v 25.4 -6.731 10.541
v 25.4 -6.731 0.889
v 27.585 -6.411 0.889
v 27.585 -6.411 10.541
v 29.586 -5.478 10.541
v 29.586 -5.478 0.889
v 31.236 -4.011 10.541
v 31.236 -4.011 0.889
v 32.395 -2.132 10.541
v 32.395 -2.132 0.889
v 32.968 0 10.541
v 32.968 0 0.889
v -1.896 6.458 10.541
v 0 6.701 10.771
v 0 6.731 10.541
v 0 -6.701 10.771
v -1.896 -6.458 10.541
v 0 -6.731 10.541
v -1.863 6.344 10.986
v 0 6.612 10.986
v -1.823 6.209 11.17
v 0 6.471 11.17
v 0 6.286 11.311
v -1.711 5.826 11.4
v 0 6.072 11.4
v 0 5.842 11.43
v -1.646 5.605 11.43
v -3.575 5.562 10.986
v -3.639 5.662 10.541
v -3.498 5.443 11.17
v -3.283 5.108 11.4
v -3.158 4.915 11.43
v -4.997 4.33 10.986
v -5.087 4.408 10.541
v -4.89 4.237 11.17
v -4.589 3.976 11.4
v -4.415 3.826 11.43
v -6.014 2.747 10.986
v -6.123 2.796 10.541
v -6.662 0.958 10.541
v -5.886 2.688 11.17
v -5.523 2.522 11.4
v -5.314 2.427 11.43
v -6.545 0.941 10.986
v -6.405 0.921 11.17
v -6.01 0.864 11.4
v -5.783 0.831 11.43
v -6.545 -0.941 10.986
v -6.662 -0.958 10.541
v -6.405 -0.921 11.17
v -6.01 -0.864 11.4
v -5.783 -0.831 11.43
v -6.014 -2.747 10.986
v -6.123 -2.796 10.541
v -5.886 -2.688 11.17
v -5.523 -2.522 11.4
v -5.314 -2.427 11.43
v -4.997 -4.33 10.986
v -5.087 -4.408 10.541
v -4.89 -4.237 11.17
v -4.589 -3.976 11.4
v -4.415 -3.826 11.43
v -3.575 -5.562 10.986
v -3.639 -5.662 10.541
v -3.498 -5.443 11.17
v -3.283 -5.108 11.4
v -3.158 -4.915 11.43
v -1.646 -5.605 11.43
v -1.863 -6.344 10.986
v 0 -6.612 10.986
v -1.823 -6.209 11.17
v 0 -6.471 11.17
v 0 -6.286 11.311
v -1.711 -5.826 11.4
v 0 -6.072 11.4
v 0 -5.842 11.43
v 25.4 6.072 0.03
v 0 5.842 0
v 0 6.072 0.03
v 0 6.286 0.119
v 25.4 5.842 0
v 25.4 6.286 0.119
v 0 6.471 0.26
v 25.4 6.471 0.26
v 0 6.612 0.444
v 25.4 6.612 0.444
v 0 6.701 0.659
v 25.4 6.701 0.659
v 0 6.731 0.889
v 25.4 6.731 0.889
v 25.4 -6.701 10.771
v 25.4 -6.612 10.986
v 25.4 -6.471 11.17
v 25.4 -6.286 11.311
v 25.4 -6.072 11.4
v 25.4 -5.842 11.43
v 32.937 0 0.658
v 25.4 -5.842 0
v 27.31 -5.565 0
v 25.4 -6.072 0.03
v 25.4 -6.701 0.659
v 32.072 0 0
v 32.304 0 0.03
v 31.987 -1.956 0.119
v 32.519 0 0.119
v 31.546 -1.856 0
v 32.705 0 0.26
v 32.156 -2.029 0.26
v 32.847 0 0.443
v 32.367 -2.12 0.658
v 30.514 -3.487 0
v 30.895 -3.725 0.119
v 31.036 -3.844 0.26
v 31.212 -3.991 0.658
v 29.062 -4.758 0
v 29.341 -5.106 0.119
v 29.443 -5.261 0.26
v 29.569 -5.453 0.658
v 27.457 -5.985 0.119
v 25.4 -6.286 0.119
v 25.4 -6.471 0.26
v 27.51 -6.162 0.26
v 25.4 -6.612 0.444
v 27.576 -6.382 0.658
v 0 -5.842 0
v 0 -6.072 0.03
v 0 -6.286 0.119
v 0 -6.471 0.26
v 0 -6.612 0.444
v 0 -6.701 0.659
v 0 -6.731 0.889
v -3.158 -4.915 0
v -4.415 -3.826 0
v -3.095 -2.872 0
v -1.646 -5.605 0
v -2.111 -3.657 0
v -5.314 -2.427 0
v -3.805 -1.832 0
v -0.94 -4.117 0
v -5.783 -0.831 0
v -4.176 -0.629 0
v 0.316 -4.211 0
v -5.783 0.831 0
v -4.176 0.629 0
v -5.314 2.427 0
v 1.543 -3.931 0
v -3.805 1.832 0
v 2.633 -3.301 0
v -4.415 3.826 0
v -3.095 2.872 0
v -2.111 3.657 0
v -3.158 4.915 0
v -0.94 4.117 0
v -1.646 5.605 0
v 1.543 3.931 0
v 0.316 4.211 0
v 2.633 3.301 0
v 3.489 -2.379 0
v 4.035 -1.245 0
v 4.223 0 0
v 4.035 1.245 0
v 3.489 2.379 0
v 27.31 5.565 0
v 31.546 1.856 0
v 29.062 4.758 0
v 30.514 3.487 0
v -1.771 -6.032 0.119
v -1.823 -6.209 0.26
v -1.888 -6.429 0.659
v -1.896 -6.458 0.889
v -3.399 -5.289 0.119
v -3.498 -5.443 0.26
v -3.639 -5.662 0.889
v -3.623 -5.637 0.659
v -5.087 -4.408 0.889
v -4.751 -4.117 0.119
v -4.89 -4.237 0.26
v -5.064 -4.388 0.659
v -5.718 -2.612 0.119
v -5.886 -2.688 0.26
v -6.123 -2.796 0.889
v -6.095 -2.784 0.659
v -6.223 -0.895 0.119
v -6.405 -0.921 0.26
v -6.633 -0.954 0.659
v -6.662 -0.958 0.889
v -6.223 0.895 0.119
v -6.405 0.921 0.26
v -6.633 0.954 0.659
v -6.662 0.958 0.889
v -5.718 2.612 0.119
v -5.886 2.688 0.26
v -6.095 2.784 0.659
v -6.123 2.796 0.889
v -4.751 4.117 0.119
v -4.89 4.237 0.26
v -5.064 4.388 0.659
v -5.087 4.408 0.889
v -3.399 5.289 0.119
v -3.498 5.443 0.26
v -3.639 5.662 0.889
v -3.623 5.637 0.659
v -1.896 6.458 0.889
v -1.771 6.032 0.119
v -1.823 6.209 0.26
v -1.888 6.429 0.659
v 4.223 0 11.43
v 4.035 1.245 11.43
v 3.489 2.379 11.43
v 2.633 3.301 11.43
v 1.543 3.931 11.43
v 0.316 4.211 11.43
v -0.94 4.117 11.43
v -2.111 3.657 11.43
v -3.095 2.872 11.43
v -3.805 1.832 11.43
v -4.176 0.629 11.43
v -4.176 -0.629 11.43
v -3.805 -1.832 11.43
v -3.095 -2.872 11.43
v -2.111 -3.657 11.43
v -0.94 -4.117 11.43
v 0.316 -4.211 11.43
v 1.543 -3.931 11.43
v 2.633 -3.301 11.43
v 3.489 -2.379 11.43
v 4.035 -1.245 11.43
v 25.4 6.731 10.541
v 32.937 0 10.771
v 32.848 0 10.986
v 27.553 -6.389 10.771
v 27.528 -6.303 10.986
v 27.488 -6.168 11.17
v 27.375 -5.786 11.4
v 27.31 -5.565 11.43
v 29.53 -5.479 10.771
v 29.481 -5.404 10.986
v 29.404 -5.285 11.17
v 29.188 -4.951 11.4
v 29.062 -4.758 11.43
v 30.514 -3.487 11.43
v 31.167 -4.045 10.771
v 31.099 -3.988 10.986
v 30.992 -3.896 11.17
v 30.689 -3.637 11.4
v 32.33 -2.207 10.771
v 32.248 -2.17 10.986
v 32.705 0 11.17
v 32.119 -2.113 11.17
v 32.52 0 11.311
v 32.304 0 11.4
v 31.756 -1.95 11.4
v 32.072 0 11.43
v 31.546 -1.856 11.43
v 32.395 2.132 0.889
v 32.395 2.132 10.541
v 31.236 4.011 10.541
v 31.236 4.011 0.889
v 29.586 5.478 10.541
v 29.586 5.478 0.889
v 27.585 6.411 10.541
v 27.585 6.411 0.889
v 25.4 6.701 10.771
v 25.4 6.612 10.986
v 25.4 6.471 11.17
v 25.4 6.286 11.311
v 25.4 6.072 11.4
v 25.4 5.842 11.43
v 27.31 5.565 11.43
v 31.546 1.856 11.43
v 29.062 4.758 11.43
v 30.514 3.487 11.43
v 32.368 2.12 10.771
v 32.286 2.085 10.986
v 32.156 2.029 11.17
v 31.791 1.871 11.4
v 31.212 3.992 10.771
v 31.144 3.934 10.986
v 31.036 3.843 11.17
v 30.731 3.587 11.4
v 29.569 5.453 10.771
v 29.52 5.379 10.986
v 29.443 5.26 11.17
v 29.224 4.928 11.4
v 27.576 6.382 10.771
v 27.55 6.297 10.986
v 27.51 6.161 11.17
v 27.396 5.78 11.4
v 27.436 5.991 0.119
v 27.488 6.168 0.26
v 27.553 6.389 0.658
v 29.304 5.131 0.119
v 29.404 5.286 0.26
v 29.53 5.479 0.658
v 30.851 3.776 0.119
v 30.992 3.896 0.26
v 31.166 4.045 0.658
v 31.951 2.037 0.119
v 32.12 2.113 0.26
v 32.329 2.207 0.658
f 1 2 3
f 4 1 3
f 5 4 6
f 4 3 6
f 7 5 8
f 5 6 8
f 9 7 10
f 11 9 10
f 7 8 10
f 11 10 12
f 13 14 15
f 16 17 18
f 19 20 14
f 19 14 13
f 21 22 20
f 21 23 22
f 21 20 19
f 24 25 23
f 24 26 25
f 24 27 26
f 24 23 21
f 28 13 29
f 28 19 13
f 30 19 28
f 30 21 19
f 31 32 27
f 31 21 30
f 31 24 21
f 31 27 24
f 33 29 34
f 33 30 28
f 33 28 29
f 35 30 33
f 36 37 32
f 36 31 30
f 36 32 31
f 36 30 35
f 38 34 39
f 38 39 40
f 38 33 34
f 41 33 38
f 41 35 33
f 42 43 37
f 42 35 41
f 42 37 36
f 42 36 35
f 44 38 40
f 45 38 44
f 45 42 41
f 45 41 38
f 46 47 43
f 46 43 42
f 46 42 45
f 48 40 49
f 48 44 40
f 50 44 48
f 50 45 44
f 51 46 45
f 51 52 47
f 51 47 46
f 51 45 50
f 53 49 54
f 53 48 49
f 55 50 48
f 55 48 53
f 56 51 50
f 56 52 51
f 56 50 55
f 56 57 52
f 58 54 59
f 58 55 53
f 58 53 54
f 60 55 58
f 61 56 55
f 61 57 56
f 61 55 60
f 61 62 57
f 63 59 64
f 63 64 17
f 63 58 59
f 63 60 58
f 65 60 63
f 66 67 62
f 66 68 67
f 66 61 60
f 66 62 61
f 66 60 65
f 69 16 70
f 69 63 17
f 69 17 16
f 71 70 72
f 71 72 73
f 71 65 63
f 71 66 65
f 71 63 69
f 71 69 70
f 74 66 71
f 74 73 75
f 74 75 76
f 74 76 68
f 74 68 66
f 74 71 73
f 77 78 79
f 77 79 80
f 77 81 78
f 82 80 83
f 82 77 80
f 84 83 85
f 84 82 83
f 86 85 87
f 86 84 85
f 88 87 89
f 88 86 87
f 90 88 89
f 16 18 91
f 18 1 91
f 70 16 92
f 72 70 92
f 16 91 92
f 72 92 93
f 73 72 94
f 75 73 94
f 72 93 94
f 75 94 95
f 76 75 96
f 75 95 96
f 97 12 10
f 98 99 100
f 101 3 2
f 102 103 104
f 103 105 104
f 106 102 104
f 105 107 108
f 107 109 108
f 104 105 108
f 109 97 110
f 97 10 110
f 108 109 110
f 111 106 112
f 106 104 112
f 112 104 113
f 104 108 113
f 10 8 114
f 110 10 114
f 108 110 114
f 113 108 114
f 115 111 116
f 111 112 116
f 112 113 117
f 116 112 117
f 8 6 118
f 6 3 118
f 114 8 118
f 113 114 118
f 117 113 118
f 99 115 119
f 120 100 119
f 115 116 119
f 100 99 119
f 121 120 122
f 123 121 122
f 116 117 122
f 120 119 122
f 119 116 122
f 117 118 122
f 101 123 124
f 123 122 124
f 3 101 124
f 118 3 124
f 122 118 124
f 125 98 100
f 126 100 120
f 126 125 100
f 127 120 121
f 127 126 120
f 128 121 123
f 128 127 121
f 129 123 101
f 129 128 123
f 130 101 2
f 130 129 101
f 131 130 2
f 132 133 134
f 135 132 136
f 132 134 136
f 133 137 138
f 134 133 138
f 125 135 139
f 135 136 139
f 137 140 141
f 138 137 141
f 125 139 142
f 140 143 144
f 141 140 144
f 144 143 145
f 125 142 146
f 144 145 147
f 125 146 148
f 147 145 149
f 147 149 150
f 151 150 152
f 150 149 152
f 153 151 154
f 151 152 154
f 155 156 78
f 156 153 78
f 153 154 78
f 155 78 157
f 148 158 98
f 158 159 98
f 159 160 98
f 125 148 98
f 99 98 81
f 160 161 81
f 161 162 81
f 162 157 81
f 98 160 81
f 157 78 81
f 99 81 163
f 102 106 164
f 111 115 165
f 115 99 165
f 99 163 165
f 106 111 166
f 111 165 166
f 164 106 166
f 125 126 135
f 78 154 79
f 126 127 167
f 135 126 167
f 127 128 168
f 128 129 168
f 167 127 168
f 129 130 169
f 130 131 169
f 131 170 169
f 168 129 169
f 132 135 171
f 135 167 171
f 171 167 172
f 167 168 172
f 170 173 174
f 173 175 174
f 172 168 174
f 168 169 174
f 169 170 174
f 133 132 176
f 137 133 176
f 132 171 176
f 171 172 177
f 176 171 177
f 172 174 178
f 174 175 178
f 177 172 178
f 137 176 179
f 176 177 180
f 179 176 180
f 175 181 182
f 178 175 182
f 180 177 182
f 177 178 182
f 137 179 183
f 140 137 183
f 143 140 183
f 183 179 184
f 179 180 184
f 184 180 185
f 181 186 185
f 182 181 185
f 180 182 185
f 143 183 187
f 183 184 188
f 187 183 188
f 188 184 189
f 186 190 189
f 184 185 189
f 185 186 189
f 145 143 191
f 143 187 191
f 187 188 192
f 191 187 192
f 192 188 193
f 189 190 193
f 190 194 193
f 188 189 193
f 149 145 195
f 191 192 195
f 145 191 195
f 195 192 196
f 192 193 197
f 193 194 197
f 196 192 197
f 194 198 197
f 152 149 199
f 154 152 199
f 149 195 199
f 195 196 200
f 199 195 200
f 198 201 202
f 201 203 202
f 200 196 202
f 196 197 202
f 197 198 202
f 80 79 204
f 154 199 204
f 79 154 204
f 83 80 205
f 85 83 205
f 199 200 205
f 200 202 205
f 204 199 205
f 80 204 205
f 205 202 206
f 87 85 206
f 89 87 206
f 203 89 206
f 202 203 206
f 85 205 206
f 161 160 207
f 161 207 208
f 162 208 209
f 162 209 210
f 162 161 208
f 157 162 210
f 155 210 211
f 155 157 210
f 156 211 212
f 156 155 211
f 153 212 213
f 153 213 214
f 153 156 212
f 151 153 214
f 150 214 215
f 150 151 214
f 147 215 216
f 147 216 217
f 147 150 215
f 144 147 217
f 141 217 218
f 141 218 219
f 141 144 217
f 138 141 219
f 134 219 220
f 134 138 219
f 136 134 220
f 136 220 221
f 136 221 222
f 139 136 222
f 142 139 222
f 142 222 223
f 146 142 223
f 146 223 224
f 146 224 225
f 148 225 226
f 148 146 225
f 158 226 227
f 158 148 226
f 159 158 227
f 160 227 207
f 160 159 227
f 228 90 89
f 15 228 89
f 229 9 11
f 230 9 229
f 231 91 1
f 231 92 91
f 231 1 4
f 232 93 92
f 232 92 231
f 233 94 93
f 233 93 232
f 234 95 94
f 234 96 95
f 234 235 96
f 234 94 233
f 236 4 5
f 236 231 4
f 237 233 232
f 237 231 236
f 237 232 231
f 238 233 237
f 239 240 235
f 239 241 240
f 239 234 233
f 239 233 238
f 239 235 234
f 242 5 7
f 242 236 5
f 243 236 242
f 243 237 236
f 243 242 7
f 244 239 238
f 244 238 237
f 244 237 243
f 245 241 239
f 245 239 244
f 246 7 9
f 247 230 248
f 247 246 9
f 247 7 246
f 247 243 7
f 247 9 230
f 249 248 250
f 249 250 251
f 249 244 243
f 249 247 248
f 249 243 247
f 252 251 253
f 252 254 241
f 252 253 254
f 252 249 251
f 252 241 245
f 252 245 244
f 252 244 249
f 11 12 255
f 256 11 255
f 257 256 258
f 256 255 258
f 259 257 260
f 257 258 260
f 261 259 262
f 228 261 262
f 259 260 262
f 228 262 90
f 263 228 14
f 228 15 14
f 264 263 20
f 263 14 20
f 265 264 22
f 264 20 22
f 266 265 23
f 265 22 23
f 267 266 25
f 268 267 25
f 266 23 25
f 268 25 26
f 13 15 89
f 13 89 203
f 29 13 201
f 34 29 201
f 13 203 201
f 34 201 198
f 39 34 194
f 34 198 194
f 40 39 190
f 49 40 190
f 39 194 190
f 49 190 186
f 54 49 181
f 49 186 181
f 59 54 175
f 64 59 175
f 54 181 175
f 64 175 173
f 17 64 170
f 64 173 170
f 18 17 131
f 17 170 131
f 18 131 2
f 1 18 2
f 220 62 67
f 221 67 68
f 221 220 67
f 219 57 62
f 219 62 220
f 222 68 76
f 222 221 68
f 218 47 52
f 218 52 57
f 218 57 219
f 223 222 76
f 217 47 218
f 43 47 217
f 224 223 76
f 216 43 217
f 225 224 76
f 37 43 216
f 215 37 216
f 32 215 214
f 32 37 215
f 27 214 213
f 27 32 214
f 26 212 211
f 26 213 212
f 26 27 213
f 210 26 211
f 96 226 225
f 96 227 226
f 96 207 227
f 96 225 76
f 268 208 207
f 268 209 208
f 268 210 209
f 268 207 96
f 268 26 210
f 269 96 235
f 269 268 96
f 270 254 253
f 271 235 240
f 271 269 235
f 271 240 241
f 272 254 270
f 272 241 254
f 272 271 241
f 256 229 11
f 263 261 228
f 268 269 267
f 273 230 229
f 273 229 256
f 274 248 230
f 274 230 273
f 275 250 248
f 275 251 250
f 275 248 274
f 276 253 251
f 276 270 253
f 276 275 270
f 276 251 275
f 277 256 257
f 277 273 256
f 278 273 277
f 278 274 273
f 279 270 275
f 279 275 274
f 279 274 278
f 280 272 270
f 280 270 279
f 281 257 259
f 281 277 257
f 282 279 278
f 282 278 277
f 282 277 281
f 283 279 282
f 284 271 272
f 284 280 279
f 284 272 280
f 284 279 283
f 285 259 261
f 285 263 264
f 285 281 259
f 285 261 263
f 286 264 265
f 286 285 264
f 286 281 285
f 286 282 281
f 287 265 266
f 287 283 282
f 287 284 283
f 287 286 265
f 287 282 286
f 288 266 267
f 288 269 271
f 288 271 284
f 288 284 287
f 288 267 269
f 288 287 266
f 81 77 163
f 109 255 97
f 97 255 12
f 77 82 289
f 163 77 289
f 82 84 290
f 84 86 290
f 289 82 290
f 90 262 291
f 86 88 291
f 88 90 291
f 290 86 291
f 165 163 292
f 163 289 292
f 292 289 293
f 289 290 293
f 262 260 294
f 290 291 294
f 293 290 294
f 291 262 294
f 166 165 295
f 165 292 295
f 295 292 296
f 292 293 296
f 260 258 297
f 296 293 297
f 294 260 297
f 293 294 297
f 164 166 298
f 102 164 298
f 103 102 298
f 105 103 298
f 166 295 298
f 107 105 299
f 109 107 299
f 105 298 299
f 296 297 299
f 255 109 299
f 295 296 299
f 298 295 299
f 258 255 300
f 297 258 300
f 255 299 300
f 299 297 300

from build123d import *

# Parameters (mm, degrees)
SKETCH1_R           = 6.731
SKETCH1_R_2         = 4.22275
BOSS_EXTRUDE1_DEPTH = 11.43
FRONT_FILLET_R      = 7.62
SIDE_FILLET_R       = 0.889


with BuildPart() as part:
    # Sketch1 → Boss-Extrude1 (new body)
    # profile 1 of 2: a face of its own
    with BuildSketch(Plane.XY):
        with BuildLine():
            Line((33.02, 6.731), (0, 6.731))
            ThreePointArc((0, 6.731), (4.759535744, 4.759535744), (6.731, 0))
            ThreePointArc((6.731, 0), (4.759535744, -4.759535744), (0, -6.731))
            Line((0, -6.731), (33.02, -6.731))
            Line((33.02, -6.731), (33.02, 6.731))
        make_face()
    # profile 2 of 2: a face of its own
    with BuildSketch(Plane.XY):
        Circle(SKETCH1_R)
        Circle(SKETCH1_R_2, mode=Mode.SUBTRACT)
    extrude(amount=BOSS_EXTRUDE1_DEPTH)

    # Front Fillet
    # the kernel refuses this fillet: 7.62 mm, written as the material it takes off along each edge
    with BuildSketch(Plane(origin=(33.02, -6.731, -19.05), x_dir=(-1, 0, 0), z_dir=(0, 0, 1)), Plane(origin=(33.02, 6.731, -19.05), x_dir=(0, -1, 0), z_dir=(0, 0, 1))) as front_fillet_piece_1:
        with BuildLine():
            CenterArc((FRONT_FILLET_R, -FRONT_FILLET_R), FRONT_FILLET_R, 90, 90)
            Line((0, -FRONT_FILLET_R), (0, 0))
            Line((0, 0), (FRONT_FILLET_R, 0))
        make_face()
    extrude(amount=49.53, mode=Mode.SUBTRACT)

    # Side Fillet
    side_fillet_edges = [part.edges().sort_by_distance(p)[0] for p in [
        (-6.731, 0, 11.43),
        (12.7, -6.731, 11.43),
        (30.464100117, 4.80479399, 0),
        (30.464100117, -4.80479399, 0),
        (30.464100117, 4.80479399, 11.43),
        (30.464100117, -4.80479399, 11.43),
        (12.7, 6.731, 11.43),
        (12.7, -6.731, 0),
        (-6.731, 0, 0),
        (12.7, 6.731, 0),
    ]]
    fillet(side_fillet_edges, radius=SIDE_FILLET_R)


solid = part.part
